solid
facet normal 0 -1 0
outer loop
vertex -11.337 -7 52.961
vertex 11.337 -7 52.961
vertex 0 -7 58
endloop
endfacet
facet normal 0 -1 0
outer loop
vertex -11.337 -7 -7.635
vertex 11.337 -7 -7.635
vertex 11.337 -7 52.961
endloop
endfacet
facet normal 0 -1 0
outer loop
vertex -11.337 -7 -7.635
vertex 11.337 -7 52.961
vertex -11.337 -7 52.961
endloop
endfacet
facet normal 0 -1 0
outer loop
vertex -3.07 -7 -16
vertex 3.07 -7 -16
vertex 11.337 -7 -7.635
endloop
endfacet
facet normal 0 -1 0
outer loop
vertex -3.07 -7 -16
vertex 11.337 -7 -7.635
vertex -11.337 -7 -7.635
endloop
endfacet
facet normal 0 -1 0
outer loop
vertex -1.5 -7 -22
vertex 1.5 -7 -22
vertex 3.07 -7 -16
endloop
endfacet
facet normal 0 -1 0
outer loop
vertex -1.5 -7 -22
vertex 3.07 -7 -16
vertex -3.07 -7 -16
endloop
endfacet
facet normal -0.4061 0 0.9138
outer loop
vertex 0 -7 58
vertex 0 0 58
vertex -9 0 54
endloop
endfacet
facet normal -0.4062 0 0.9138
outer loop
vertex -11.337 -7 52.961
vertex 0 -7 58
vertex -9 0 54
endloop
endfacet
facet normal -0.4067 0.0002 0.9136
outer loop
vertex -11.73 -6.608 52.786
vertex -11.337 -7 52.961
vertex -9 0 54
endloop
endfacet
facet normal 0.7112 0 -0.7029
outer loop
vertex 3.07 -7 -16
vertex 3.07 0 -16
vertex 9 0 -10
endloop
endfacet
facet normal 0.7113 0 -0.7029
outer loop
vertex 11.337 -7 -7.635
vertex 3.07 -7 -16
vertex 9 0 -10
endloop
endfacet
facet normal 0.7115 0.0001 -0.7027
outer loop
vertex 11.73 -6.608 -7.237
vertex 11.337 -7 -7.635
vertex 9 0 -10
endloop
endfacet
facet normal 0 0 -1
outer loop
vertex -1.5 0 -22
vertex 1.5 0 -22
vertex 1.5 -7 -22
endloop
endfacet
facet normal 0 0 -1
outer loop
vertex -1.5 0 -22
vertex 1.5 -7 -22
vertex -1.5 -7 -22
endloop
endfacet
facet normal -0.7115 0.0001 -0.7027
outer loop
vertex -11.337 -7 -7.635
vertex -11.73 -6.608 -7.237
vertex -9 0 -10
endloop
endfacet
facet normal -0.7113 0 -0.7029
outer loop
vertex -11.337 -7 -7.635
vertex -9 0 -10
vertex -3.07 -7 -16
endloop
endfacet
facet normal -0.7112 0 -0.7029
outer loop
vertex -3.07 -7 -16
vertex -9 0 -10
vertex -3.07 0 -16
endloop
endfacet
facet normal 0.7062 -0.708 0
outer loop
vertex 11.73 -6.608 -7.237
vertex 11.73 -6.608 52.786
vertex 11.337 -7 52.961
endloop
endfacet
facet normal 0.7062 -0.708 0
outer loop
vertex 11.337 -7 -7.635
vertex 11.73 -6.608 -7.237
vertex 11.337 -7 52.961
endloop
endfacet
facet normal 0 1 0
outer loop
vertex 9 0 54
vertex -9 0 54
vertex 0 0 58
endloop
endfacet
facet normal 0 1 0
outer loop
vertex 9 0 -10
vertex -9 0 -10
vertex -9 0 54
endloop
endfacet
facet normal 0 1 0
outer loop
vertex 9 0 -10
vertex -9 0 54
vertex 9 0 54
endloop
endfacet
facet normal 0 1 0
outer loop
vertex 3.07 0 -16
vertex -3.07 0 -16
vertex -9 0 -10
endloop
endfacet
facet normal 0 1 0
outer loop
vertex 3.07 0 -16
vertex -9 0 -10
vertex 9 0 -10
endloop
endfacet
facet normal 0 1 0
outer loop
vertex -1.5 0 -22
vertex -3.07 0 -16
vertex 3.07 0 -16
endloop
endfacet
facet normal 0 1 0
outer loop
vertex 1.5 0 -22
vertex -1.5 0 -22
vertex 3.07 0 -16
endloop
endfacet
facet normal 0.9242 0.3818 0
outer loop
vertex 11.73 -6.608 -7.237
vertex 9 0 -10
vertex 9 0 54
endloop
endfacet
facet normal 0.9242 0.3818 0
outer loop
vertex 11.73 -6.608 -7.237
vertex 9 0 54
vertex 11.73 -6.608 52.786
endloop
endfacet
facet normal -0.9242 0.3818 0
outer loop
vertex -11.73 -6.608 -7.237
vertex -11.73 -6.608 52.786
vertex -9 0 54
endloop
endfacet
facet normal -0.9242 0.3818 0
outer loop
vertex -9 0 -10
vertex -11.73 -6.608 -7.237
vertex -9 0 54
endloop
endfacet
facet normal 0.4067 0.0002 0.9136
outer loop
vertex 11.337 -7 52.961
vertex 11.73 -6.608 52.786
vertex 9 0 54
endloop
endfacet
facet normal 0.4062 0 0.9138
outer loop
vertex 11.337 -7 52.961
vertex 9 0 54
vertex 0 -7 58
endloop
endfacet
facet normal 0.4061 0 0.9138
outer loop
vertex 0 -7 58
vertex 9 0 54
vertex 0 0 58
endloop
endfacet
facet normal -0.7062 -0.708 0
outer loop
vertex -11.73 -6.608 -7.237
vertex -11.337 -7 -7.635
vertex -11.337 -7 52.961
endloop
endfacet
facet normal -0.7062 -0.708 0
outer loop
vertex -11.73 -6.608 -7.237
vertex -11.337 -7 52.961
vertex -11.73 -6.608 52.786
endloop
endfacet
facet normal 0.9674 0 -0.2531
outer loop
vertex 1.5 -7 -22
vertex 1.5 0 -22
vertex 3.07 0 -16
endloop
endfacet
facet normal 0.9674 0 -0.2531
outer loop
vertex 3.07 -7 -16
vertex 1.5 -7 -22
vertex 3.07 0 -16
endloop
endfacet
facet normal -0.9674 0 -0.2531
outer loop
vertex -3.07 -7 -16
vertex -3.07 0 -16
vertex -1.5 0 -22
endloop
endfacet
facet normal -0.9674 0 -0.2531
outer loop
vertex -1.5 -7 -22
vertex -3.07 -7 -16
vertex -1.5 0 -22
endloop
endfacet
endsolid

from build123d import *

# Parameters (mm, degrees)
BOSS_EXTRUDE1_START = -22
BOSS_EXTRUDE1_DEPTH = 80
SKETCH3_OUTSIDE_W   = 42.192
SKETCH3_OUTSIDE_H   = 98.732
CUT_EXTRUDE1_DEPTH  = 60.586928072


with BuildPart() as part:
    # Sketch2 → Boss-Extrude1 (new body)
    with BuildSketch(Plane.XY.offset(BOSS_EXTRUDE1_START)):
        Polygon((9, 0), (11.730387764, -6.607891004), (11.336920491, -7), (-11.336920491, -7), (-11.730387764, -6.607891004), (-9, 0), align=None)
    extrude(amount=BOSS_EXTRUDE1_DEPTH)

    # Sketch3 outside → Cut-Extrude1 (cut, through all)
    with BuildSketch(Plane(origin=(0, 0, 0), x_dir=(1, 0, 0), z_dir=(0, 1, 0))):
        with Locations((0, -18)):
            Rectangle(SKETCH3_OUTSIDE_W, SKETCH3_OUTSIDE_H)
        Polygon((-11.730387764, 7.23737522), (-3.070013885, 16), (-1.5, 22), (1.5, 22), (3.070013885, 16), (11.730387764, 7.23737522), (11.730387764, -52.786494327), (0, -58), (-11.730387764, -52.786494327), align=None, mode=Mode.SUBTRACT)
    extrude(amount=-CUT_EXTRUDE1_DEPTH, mode=Mode.SUBTRACT)


solid = part.part
